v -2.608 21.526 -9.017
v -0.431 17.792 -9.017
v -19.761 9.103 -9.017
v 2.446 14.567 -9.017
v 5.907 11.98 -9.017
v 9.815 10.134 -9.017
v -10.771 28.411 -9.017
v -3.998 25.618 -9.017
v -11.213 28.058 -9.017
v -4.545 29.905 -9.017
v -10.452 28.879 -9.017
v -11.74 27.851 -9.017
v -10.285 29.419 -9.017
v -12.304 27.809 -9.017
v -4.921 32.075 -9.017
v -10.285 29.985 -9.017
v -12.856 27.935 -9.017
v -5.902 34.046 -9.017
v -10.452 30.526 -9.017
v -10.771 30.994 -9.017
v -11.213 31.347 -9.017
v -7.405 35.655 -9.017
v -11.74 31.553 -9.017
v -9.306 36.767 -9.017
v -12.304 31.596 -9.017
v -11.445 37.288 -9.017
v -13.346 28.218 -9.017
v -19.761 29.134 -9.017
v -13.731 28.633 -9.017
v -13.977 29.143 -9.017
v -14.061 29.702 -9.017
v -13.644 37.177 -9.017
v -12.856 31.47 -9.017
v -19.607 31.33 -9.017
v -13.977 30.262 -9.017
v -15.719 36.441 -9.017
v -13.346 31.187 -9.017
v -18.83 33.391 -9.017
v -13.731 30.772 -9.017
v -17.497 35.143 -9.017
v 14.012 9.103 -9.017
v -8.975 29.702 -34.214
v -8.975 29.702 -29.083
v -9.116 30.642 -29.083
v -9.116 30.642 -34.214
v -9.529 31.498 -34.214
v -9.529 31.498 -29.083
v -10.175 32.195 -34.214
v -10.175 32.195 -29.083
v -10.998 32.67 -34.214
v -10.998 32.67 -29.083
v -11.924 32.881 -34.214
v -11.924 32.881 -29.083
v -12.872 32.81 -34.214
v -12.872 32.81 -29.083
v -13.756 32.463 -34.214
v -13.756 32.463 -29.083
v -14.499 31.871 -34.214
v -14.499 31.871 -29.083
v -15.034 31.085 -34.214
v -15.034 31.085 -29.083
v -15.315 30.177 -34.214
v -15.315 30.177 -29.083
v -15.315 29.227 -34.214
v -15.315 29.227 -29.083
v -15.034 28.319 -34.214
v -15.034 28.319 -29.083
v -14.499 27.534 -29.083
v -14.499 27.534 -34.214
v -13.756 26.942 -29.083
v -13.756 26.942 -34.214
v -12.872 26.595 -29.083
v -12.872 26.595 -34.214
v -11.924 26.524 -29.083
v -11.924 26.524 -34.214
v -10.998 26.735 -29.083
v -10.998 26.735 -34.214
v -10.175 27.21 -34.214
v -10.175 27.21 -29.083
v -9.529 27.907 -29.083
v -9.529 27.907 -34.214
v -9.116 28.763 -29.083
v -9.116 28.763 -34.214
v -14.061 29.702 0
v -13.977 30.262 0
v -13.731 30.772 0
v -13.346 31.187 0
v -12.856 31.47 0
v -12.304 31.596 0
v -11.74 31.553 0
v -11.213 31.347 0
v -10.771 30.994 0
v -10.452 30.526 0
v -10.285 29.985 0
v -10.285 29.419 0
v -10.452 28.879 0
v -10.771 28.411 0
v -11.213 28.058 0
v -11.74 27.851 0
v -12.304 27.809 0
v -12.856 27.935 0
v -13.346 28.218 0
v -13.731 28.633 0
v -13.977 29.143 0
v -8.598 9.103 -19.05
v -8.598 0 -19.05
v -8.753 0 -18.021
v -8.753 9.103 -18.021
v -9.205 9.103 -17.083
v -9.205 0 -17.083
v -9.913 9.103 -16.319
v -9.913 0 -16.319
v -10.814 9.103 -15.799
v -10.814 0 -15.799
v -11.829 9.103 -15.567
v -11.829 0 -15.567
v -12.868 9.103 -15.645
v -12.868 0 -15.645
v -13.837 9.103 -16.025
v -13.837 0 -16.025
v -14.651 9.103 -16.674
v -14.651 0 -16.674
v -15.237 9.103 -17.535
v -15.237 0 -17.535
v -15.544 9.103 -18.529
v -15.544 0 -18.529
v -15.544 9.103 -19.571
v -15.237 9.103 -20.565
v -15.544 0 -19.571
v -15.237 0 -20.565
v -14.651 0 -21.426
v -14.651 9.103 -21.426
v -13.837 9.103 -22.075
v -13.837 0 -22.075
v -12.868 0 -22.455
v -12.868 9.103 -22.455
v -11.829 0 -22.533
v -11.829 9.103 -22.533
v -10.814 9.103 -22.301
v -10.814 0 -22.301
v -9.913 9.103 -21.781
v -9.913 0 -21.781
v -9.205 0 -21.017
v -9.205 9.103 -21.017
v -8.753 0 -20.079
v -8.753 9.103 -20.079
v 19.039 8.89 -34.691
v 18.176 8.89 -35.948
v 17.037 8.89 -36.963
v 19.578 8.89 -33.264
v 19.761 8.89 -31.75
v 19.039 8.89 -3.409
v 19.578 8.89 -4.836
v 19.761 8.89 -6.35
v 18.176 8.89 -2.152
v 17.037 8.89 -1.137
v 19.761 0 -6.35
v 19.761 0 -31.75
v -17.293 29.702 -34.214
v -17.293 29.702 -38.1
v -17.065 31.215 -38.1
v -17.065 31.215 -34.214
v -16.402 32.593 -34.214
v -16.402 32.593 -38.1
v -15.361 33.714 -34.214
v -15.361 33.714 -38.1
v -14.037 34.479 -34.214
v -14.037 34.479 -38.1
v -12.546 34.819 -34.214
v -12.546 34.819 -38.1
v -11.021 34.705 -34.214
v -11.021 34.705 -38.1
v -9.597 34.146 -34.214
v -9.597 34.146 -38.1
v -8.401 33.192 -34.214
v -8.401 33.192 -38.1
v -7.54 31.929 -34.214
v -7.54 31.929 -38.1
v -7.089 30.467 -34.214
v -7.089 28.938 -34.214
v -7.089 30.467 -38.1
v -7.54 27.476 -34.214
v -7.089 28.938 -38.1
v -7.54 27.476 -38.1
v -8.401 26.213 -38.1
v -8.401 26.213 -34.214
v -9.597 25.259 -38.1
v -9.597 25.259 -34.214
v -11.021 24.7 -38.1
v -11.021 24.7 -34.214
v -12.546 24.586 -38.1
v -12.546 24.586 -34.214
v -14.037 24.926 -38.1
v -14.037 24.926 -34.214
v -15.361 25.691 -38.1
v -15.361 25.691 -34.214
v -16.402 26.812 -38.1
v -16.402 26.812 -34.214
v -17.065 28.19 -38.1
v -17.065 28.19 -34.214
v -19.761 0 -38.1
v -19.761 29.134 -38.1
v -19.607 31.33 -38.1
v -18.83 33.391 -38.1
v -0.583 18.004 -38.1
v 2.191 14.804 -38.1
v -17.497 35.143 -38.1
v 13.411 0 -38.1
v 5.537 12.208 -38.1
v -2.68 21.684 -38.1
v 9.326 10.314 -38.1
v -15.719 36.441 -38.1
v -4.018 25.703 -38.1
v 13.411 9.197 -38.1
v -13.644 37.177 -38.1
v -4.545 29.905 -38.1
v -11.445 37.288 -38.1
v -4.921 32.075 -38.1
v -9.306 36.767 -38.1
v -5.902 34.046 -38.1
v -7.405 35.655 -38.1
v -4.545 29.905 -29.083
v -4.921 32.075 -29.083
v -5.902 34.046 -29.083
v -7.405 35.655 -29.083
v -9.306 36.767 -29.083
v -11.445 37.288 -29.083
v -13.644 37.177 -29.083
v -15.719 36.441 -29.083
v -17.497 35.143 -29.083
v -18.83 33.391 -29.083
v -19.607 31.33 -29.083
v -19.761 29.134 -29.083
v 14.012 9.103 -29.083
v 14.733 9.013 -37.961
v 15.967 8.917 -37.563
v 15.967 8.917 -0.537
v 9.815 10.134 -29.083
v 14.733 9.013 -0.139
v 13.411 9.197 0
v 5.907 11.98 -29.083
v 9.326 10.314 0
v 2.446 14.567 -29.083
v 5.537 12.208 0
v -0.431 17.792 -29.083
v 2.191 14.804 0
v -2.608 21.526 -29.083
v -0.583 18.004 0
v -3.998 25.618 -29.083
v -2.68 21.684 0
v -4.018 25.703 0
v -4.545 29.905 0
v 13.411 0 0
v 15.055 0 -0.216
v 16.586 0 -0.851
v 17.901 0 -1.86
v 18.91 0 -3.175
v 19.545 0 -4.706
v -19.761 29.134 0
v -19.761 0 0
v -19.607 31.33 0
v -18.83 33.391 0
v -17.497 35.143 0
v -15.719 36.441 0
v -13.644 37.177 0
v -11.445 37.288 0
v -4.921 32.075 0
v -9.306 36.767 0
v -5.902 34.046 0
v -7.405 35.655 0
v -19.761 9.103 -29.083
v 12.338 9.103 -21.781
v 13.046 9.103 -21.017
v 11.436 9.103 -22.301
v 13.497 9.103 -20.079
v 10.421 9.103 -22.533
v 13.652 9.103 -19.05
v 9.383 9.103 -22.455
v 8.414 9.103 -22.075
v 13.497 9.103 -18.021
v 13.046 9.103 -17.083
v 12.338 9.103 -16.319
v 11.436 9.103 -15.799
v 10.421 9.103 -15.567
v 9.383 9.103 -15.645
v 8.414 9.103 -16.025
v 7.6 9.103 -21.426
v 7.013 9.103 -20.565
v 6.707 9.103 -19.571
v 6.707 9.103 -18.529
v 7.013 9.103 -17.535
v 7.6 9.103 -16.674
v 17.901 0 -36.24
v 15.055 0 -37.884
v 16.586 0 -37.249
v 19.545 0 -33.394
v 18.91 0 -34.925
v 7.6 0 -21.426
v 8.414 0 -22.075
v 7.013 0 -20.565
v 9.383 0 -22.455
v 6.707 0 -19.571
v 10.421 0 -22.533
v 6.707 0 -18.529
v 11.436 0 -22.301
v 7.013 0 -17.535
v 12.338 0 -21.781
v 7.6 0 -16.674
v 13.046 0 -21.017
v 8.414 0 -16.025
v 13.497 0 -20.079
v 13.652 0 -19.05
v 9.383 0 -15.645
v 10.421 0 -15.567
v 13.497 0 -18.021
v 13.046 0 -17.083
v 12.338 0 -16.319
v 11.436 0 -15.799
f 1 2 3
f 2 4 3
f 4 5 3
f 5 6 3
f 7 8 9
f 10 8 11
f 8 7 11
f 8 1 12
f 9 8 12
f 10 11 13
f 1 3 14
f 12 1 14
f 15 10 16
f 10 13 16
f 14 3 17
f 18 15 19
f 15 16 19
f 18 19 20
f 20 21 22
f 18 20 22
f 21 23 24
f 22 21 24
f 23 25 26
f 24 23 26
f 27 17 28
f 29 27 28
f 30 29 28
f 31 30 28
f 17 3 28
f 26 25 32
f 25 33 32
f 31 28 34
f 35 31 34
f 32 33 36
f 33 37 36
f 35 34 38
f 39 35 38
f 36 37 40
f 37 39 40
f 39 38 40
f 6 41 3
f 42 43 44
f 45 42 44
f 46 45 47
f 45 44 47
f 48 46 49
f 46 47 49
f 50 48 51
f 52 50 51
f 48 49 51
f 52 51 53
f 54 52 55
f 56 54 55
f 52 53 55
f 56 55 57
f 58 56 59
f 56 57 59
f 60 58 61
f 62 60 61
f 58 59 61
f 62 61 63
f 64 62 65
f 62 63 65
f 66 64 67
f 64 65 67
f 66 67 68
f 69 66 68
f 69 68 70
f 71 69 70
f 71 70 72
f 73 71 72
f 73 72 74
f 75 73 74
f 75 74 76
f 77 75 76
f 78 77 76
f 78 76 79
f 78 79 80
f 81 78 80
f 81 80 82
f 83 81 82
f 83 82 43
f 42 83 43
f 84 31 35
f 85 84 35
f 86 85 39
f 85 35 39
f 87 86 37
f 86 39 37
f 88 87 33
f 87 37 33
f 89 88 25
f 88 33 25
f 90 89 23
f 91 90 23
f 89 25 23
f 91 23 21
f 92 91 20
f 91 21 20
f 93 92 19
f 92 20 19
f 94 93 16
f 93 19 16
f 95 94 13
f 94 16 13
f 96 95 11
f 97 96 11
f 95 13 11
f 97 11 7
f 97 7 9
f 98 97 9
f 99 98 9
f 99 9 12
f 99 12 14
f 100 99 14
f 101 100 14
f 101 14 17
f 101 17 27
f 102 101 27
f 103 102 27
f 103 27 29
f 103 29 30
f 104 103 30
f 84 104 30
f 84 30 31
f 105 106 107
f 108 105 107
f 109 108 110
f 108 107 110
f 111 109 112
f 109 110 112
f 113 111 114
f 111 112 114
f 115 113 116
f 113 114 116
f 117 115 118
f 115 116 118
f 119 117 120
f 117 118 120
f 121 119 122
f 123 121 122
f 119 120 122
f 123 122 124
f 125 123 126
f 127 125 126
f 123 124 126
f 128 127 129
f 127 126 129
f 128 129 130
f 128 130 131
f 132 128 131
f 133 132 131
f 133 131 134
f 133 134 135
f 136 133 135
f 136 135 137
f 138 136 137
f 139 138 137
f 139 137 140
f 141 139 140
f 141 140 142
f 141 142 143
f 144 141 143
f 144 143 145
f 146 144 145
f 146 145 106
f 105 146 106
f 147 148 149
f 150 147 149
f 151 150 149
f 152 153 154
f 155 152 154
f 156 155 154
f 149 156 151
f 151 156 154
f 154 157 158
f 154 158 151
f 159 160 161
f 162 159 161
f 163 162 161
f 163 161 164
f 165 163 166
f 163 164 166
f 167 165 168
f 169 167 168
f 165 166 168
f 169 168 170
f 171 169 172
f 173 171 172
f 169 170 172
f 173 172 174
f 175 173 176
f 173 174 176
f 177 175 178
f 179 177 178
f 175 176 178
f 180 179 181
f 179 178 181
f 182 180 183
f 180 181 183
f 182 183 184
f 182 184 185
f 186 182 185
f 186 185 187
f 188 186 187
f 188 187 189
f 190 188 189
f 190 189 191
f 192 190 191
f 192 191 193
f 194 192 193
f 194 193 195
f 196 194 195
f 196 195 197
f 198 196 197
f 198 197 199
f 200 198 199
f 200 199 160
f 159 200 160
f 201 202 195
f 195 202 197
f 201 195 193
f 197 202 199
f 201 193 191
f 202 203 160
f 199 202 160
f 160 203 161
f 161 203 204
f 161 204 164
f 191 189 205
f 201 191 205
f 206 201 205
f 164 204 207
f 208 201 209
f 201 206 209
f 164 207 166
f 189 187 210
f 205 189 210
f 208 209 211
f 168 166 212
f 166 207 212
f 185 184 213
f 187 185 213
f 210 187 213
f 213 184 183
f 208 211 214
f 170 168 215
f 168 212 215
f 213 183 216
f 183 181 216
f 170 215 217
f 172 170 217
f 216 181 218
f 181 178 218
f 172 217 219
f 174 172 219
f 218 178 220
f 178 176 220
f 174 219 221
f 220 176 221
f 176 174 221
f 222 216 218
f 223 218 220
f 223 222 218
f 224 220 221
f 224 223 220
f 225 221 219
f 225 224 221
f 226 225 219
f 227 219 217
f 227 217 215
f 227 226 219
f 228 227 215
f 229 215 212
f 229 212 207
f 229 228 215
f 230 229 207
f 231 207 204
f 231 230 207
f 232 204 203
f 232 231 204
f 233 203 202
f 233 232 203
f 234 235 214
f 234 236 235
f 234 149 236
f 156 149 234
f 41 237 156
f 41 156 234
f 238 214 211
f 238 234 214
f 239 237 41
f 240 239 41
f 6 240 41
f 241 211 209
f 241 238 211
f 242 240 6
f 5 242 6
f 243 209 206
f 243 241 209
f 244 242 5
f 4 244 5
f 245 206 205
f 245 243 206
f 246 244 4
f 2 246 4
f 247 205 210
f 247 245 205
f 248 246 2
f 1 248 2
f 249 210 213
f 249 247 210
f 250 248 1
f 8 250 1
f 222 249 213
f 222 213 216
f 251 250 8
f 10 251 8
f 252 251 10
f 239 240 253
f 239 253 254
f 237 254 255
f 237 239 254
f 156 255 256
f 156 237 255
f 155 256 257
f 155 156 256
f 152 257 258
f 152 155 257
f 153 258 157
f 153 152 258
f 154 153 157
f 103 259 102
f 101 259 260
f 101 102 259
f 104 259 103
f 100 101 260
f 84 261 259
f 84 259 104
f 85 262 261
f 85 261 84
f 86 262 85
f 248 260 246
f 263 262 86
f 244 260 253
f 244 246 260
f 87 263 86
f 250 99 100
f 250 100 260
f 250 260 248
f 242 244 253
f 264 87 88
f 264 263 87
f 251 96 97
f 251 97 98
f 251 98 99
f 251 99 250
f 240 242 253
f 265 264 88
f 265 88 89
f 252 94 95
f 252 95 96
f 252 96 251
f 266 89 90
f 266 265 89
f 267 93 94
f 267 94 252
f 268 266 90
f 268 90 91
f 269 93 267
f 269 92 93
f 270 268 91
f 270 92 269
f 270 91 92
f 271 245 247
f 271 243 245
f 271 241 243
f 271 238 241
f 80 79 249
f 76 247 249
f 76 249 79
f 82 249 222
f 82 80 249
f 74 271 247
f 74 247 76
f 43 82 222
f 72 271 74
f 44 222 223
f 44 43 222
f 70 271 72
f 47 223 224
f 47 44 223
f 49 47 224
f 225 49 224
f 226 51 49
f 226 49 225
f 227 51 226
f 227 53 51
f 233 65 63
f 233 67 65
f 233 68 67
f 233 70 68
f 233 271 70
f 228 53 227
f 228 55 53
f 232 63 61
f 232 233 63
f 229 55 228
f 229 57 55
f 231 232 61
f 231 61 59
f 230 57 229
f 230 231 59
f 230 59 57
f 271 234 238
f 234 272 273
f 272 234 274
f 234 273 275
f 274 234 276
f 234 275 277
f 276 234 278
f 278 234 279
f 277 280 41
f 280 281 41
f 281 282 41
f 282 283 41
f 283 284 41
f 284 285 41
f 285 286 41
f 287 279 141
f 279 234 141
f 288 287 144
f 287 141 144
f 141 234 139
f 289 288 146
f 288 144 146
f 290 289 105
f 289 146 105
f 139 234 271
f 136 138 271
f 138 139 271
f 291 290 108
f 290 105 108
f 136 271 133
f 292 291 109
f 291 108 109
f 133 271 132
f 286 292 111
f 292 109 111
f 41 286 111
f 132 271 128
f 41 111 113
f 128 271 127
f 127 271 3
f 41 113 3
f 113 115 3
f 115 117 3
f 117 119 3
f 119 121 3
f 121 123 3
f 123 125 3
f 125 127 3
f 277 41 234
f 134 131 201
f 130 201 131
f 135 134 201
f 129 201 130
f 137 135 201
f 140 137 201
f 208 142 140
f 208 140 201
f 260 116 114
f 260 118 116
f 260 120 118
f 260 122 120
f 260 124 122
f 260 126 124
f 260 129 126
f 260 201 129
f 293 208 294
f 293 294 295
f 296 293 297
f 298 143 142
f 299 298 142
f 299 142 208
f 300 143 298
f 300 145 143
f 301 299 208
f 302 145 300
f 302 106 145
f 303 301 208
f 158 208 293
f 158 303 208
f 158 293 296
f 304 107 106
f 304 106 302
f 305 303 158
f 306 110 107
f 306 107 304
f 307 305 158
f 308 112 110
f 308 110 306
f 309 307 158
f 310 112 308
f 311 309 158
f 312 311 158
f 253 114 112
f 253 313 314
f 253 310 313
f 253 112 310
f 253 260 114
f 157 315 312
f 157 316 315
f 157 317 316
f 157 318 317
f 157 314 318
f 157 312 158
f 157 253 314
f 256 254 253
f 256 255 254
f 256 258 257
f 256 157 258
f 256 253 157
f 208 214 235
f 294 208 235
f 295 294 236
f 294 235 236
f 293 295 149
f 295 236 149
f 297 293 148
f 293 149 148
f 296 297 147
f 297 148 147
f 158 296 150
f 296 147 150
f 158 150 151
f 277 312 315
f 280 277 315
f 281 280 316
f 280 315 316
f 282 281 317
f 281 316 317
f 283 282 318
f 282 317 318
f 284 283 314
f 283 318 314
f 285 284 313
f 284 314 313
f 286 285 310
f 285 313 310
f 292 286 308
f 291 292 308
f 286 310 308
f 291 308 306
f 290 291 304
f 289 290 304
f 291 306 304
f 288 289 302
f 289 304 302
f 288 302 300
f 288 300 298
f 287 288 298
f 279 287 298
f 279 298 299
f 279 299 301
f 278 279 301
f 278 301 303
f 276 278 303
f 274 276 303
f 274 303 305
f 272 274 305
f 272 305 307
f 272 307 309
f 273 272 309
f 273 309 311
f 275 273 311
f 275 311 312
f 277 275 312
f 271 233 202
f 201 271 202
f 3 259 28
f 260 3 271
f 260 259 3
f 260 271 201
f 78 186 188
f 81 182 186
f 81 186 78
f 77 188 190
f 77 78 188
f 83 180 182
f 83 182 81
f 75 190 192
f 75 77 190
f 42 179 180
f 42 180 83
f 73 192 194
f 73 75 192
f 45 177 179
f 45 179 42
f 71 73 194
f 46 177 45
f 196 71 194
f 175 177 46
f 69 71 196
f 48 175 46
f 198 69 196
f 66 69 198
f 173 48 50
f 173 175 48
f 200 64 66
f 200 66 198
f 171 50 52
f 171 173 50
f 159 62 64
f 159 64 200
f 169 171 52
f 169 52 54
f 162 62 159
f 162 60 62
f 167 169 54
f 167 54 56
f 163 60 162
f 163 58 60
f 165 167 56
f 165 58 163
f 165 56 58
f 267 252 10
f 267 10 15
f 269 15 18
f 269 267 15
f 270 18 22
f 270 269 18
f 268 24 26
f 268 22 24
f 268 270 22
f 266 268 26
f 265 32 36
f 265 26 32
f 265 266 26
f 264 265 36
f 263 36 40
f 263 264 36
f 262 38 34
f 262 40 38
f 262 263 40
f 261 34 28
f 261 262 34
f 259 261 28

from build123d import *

# Parameters (mm, degrees)
BOSS_EXTRUDE1_DEPTH                              = 38.1
SKETCH3_W                                        = 20.066
SKETCH3_H                                        = 28.2194
CUT_EXTRUDE1_DEPTH                               = 1.021241984
CUT_EXTRUDE1_DEPTH_BACK                          = 40.5224
F_10_24_TAPPED_HOLE1_D                           = 3.7973
F_10_24_TAPPED_HOLE1_DEPTH                       = 12.954
F_10_24_TAPPED_HOLE1_TIP                         = 1.140824014
CBORE_FOR_1_4_SOCKET_SHOULDER_SCREW1_D           = 6.3754
CBORE_FOR_1_4_SOCKET_SHOULDER_SCREW1_DEPTH       = 9.017
CBORE_FOR_1_4_SOCKET_SHOULDER_SCREW1_CBORE_D     = 10.2616
CBORE_FOR_1_4_SOCKET_SHOULDER_SCREW1_CBORE_DEPTH = 3.8862
SKETCH13_R                                       = 3.4925
CUT_EXTRUDE2_DEPTH                               = 38.322374195
FILLET1_R                                        = 6.35


with BuildPart() as part:
    # Sketch1 → Boss-Extrude1 (new body)
    with BuildSketch(Plane.XY):
        with BuildLine():
            Line((-19.7612, 0), (19.7612, 0))
            Line((19.7612, 0), (19.7612, 8.89))
            Line((19.7612, 8.89), (17.037205242, 8.89))
            ThreePointArc((17.037205242, 8.89), (1.975351394, 15.011688564), (-4.545142708, 29.905233101))
            ThreePointArc((-4.545142708, 29.905233101), (-12.548269927, 37.3126), (-19.7612, 29.1338))
            Line((-19.7612, 29.1338), (-19.7612, 0))
        make_face()
    extrude(amount=-BOSS_EXTRUDE1_DEPTH)

    # Sketch3 → Cut-Extrude1 (cut, two sides)
    with BuildSketch(Plane.ZY.offset(19.7612)) as cut_extrude1_sk:
        with Locations((-19.05, 23.212674195)):
            Rectangle(SKETCH3_W, SKETCH3_H)
    extrude(amount=CUT_EXTRUDE1_DEPTH, mode=Mode.SUBTRACT)
    extrude(cut_extrude1_sk.sketch, amount=-CUT_EXTRUDE1_DEPTH_BACK, mode=Mode.SUBTRACT)

    # #10-24 Tapped Hole1
    with Locations(Plane.XY):
        with Locations((-12.162441984, 29.702374195)):
            Hole(F_10_24_TAPPED_HOLE1_D / 2, depth=F_10_24_TAPPED_HOLE1_DEPTH)
            with Locations((0, 0, -(F_10_24_TAPPED_HOLE1_DEPTH + F_10_24_TAPPED_HOLE1_TIP / 2))):  # 118° drill point
                Cone(0, F_10_24_TAPPED_HOLE1_D / 2, F_10_24_TAPPED_HOLE1_TIP, mode=Mode.SUBTRACT)

    # CBORE for 1/4 Socket Shoulder Screw1
    with Locations(Plane(origin=(0, 0, -38.1), x_dir=(-1, 0, 0), z_dir=(0, 0, -1))):
        with Locations((12.162441984, 29.702374195)):
            CounterBoreHole(CBORE_FOR_1_4_SOCKET_SHOULDER_SCREW1_D / 2, CBORE_FOR_1_4_SOCKET_SHOULDER_SCREW1_CBORE_D / 2, CBORE_FOR_1_4_SOCKET_SHOULDER_SCREW1_CBORE_DEPTH, depth=CBORE_FOR_1_4_SOCKET_SHOULDER_SCREW1_DEPTH)

    # Sketch13 → Cut-Extrude2 (cut, through all)
    with BuildSketch(Plane.XZ):
        with Locations((-12.0904, -19.05)):
            Circle(SKETCH13_R)
        with Locations((10.16, -19.05)):
            Circle(SKETCH13_R)
    extrude(amount=-CUT_EXTRUDE2_DEPTH, mode=Mode.SUBTRACT)

    # Fillet1
    fillet1_edges = [part.edges().sort_by_distance(p)[0] for p in [
        (19.7612, 4.445, -38.1),
        (19.7612, 4.445, 0),
    ]]
    fillet(fillet1_edges, radius=FILLET1_R)


solid = part.part
